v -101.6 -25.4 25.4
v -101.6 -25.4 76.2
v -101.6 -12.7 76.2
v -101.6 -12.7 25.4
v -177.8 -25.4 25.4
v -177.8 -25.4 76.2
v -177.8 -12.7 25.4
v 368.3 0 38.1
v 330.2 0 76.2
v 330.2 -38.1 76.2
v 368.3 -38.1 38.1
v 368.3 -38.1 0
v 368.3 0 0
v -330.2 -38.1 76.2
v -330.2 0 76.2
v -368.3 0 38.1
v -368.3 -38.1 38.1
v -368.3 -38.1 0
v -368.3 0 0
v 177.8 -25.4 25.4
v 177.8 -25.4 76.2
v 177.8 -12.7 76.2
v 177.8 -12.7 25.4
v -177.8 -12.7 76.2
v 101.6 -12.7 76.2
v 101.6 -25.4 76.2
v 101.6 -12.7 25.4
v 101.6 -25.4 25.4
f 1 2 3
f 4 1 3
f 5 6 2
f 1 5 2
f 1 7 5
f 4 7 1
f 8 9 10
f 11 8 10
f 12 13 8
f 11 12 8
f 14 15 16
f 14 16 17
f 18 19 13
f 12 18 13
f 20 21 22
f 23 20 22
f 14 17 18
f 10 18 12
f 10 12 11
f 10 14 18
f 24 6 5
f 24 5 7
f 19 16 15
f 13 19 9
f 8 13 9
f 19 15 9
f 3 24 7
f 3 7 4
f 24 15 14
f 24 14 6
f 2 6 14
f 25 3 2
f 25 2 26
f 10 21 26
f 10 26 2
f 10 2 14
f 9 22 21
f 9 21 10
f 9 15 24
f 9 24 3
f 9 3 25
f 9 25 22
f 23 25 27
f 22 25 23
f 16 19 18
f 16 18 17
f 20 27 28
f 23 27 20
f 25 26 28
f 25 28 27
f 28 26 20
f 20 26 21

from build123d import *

# Parameters (mm, degrees)
F0_W     = 736.6
F0_H     = 76.2
F1_DEPTH = 38.1
F2_SIZE  = 38.1
F3_W     = 76.2
F3_H     = 12.7
F4_DEPTH = 50.8


with BuildPart() as f1:
    # F0 (on Front) → F1 (new body)
    with BuildSketch(Plane.XZ):
        with Locations((0, 38.1)):
            Rectangle(F0_W, F0_H)
    extrude(amount=F1_DEPTH)

    # F2
    f2_edges = [f1.edges().sort_by_distance(p)[0] for p in [
        (-368.3, -19.05, 76.2),
        (368.3, -19.05, 76.2),
    ]]
    chamfer(f2_edges, length=F2_SIZE)

    # F3 (on face) → F4 (cut)
    with BuildSketch(Plane.XY.offset(76.2)):
        with Locations((-139.7, -19.05)):
            Rectangle(F3_W, F3_H)
        with Locations((139.7, -19.05)):
            Rectangle(F3_W, F3_H)
    extrude(amount=-F4_DEPTH, mode=Mode.SUBTRACT)


solid = f1.part
